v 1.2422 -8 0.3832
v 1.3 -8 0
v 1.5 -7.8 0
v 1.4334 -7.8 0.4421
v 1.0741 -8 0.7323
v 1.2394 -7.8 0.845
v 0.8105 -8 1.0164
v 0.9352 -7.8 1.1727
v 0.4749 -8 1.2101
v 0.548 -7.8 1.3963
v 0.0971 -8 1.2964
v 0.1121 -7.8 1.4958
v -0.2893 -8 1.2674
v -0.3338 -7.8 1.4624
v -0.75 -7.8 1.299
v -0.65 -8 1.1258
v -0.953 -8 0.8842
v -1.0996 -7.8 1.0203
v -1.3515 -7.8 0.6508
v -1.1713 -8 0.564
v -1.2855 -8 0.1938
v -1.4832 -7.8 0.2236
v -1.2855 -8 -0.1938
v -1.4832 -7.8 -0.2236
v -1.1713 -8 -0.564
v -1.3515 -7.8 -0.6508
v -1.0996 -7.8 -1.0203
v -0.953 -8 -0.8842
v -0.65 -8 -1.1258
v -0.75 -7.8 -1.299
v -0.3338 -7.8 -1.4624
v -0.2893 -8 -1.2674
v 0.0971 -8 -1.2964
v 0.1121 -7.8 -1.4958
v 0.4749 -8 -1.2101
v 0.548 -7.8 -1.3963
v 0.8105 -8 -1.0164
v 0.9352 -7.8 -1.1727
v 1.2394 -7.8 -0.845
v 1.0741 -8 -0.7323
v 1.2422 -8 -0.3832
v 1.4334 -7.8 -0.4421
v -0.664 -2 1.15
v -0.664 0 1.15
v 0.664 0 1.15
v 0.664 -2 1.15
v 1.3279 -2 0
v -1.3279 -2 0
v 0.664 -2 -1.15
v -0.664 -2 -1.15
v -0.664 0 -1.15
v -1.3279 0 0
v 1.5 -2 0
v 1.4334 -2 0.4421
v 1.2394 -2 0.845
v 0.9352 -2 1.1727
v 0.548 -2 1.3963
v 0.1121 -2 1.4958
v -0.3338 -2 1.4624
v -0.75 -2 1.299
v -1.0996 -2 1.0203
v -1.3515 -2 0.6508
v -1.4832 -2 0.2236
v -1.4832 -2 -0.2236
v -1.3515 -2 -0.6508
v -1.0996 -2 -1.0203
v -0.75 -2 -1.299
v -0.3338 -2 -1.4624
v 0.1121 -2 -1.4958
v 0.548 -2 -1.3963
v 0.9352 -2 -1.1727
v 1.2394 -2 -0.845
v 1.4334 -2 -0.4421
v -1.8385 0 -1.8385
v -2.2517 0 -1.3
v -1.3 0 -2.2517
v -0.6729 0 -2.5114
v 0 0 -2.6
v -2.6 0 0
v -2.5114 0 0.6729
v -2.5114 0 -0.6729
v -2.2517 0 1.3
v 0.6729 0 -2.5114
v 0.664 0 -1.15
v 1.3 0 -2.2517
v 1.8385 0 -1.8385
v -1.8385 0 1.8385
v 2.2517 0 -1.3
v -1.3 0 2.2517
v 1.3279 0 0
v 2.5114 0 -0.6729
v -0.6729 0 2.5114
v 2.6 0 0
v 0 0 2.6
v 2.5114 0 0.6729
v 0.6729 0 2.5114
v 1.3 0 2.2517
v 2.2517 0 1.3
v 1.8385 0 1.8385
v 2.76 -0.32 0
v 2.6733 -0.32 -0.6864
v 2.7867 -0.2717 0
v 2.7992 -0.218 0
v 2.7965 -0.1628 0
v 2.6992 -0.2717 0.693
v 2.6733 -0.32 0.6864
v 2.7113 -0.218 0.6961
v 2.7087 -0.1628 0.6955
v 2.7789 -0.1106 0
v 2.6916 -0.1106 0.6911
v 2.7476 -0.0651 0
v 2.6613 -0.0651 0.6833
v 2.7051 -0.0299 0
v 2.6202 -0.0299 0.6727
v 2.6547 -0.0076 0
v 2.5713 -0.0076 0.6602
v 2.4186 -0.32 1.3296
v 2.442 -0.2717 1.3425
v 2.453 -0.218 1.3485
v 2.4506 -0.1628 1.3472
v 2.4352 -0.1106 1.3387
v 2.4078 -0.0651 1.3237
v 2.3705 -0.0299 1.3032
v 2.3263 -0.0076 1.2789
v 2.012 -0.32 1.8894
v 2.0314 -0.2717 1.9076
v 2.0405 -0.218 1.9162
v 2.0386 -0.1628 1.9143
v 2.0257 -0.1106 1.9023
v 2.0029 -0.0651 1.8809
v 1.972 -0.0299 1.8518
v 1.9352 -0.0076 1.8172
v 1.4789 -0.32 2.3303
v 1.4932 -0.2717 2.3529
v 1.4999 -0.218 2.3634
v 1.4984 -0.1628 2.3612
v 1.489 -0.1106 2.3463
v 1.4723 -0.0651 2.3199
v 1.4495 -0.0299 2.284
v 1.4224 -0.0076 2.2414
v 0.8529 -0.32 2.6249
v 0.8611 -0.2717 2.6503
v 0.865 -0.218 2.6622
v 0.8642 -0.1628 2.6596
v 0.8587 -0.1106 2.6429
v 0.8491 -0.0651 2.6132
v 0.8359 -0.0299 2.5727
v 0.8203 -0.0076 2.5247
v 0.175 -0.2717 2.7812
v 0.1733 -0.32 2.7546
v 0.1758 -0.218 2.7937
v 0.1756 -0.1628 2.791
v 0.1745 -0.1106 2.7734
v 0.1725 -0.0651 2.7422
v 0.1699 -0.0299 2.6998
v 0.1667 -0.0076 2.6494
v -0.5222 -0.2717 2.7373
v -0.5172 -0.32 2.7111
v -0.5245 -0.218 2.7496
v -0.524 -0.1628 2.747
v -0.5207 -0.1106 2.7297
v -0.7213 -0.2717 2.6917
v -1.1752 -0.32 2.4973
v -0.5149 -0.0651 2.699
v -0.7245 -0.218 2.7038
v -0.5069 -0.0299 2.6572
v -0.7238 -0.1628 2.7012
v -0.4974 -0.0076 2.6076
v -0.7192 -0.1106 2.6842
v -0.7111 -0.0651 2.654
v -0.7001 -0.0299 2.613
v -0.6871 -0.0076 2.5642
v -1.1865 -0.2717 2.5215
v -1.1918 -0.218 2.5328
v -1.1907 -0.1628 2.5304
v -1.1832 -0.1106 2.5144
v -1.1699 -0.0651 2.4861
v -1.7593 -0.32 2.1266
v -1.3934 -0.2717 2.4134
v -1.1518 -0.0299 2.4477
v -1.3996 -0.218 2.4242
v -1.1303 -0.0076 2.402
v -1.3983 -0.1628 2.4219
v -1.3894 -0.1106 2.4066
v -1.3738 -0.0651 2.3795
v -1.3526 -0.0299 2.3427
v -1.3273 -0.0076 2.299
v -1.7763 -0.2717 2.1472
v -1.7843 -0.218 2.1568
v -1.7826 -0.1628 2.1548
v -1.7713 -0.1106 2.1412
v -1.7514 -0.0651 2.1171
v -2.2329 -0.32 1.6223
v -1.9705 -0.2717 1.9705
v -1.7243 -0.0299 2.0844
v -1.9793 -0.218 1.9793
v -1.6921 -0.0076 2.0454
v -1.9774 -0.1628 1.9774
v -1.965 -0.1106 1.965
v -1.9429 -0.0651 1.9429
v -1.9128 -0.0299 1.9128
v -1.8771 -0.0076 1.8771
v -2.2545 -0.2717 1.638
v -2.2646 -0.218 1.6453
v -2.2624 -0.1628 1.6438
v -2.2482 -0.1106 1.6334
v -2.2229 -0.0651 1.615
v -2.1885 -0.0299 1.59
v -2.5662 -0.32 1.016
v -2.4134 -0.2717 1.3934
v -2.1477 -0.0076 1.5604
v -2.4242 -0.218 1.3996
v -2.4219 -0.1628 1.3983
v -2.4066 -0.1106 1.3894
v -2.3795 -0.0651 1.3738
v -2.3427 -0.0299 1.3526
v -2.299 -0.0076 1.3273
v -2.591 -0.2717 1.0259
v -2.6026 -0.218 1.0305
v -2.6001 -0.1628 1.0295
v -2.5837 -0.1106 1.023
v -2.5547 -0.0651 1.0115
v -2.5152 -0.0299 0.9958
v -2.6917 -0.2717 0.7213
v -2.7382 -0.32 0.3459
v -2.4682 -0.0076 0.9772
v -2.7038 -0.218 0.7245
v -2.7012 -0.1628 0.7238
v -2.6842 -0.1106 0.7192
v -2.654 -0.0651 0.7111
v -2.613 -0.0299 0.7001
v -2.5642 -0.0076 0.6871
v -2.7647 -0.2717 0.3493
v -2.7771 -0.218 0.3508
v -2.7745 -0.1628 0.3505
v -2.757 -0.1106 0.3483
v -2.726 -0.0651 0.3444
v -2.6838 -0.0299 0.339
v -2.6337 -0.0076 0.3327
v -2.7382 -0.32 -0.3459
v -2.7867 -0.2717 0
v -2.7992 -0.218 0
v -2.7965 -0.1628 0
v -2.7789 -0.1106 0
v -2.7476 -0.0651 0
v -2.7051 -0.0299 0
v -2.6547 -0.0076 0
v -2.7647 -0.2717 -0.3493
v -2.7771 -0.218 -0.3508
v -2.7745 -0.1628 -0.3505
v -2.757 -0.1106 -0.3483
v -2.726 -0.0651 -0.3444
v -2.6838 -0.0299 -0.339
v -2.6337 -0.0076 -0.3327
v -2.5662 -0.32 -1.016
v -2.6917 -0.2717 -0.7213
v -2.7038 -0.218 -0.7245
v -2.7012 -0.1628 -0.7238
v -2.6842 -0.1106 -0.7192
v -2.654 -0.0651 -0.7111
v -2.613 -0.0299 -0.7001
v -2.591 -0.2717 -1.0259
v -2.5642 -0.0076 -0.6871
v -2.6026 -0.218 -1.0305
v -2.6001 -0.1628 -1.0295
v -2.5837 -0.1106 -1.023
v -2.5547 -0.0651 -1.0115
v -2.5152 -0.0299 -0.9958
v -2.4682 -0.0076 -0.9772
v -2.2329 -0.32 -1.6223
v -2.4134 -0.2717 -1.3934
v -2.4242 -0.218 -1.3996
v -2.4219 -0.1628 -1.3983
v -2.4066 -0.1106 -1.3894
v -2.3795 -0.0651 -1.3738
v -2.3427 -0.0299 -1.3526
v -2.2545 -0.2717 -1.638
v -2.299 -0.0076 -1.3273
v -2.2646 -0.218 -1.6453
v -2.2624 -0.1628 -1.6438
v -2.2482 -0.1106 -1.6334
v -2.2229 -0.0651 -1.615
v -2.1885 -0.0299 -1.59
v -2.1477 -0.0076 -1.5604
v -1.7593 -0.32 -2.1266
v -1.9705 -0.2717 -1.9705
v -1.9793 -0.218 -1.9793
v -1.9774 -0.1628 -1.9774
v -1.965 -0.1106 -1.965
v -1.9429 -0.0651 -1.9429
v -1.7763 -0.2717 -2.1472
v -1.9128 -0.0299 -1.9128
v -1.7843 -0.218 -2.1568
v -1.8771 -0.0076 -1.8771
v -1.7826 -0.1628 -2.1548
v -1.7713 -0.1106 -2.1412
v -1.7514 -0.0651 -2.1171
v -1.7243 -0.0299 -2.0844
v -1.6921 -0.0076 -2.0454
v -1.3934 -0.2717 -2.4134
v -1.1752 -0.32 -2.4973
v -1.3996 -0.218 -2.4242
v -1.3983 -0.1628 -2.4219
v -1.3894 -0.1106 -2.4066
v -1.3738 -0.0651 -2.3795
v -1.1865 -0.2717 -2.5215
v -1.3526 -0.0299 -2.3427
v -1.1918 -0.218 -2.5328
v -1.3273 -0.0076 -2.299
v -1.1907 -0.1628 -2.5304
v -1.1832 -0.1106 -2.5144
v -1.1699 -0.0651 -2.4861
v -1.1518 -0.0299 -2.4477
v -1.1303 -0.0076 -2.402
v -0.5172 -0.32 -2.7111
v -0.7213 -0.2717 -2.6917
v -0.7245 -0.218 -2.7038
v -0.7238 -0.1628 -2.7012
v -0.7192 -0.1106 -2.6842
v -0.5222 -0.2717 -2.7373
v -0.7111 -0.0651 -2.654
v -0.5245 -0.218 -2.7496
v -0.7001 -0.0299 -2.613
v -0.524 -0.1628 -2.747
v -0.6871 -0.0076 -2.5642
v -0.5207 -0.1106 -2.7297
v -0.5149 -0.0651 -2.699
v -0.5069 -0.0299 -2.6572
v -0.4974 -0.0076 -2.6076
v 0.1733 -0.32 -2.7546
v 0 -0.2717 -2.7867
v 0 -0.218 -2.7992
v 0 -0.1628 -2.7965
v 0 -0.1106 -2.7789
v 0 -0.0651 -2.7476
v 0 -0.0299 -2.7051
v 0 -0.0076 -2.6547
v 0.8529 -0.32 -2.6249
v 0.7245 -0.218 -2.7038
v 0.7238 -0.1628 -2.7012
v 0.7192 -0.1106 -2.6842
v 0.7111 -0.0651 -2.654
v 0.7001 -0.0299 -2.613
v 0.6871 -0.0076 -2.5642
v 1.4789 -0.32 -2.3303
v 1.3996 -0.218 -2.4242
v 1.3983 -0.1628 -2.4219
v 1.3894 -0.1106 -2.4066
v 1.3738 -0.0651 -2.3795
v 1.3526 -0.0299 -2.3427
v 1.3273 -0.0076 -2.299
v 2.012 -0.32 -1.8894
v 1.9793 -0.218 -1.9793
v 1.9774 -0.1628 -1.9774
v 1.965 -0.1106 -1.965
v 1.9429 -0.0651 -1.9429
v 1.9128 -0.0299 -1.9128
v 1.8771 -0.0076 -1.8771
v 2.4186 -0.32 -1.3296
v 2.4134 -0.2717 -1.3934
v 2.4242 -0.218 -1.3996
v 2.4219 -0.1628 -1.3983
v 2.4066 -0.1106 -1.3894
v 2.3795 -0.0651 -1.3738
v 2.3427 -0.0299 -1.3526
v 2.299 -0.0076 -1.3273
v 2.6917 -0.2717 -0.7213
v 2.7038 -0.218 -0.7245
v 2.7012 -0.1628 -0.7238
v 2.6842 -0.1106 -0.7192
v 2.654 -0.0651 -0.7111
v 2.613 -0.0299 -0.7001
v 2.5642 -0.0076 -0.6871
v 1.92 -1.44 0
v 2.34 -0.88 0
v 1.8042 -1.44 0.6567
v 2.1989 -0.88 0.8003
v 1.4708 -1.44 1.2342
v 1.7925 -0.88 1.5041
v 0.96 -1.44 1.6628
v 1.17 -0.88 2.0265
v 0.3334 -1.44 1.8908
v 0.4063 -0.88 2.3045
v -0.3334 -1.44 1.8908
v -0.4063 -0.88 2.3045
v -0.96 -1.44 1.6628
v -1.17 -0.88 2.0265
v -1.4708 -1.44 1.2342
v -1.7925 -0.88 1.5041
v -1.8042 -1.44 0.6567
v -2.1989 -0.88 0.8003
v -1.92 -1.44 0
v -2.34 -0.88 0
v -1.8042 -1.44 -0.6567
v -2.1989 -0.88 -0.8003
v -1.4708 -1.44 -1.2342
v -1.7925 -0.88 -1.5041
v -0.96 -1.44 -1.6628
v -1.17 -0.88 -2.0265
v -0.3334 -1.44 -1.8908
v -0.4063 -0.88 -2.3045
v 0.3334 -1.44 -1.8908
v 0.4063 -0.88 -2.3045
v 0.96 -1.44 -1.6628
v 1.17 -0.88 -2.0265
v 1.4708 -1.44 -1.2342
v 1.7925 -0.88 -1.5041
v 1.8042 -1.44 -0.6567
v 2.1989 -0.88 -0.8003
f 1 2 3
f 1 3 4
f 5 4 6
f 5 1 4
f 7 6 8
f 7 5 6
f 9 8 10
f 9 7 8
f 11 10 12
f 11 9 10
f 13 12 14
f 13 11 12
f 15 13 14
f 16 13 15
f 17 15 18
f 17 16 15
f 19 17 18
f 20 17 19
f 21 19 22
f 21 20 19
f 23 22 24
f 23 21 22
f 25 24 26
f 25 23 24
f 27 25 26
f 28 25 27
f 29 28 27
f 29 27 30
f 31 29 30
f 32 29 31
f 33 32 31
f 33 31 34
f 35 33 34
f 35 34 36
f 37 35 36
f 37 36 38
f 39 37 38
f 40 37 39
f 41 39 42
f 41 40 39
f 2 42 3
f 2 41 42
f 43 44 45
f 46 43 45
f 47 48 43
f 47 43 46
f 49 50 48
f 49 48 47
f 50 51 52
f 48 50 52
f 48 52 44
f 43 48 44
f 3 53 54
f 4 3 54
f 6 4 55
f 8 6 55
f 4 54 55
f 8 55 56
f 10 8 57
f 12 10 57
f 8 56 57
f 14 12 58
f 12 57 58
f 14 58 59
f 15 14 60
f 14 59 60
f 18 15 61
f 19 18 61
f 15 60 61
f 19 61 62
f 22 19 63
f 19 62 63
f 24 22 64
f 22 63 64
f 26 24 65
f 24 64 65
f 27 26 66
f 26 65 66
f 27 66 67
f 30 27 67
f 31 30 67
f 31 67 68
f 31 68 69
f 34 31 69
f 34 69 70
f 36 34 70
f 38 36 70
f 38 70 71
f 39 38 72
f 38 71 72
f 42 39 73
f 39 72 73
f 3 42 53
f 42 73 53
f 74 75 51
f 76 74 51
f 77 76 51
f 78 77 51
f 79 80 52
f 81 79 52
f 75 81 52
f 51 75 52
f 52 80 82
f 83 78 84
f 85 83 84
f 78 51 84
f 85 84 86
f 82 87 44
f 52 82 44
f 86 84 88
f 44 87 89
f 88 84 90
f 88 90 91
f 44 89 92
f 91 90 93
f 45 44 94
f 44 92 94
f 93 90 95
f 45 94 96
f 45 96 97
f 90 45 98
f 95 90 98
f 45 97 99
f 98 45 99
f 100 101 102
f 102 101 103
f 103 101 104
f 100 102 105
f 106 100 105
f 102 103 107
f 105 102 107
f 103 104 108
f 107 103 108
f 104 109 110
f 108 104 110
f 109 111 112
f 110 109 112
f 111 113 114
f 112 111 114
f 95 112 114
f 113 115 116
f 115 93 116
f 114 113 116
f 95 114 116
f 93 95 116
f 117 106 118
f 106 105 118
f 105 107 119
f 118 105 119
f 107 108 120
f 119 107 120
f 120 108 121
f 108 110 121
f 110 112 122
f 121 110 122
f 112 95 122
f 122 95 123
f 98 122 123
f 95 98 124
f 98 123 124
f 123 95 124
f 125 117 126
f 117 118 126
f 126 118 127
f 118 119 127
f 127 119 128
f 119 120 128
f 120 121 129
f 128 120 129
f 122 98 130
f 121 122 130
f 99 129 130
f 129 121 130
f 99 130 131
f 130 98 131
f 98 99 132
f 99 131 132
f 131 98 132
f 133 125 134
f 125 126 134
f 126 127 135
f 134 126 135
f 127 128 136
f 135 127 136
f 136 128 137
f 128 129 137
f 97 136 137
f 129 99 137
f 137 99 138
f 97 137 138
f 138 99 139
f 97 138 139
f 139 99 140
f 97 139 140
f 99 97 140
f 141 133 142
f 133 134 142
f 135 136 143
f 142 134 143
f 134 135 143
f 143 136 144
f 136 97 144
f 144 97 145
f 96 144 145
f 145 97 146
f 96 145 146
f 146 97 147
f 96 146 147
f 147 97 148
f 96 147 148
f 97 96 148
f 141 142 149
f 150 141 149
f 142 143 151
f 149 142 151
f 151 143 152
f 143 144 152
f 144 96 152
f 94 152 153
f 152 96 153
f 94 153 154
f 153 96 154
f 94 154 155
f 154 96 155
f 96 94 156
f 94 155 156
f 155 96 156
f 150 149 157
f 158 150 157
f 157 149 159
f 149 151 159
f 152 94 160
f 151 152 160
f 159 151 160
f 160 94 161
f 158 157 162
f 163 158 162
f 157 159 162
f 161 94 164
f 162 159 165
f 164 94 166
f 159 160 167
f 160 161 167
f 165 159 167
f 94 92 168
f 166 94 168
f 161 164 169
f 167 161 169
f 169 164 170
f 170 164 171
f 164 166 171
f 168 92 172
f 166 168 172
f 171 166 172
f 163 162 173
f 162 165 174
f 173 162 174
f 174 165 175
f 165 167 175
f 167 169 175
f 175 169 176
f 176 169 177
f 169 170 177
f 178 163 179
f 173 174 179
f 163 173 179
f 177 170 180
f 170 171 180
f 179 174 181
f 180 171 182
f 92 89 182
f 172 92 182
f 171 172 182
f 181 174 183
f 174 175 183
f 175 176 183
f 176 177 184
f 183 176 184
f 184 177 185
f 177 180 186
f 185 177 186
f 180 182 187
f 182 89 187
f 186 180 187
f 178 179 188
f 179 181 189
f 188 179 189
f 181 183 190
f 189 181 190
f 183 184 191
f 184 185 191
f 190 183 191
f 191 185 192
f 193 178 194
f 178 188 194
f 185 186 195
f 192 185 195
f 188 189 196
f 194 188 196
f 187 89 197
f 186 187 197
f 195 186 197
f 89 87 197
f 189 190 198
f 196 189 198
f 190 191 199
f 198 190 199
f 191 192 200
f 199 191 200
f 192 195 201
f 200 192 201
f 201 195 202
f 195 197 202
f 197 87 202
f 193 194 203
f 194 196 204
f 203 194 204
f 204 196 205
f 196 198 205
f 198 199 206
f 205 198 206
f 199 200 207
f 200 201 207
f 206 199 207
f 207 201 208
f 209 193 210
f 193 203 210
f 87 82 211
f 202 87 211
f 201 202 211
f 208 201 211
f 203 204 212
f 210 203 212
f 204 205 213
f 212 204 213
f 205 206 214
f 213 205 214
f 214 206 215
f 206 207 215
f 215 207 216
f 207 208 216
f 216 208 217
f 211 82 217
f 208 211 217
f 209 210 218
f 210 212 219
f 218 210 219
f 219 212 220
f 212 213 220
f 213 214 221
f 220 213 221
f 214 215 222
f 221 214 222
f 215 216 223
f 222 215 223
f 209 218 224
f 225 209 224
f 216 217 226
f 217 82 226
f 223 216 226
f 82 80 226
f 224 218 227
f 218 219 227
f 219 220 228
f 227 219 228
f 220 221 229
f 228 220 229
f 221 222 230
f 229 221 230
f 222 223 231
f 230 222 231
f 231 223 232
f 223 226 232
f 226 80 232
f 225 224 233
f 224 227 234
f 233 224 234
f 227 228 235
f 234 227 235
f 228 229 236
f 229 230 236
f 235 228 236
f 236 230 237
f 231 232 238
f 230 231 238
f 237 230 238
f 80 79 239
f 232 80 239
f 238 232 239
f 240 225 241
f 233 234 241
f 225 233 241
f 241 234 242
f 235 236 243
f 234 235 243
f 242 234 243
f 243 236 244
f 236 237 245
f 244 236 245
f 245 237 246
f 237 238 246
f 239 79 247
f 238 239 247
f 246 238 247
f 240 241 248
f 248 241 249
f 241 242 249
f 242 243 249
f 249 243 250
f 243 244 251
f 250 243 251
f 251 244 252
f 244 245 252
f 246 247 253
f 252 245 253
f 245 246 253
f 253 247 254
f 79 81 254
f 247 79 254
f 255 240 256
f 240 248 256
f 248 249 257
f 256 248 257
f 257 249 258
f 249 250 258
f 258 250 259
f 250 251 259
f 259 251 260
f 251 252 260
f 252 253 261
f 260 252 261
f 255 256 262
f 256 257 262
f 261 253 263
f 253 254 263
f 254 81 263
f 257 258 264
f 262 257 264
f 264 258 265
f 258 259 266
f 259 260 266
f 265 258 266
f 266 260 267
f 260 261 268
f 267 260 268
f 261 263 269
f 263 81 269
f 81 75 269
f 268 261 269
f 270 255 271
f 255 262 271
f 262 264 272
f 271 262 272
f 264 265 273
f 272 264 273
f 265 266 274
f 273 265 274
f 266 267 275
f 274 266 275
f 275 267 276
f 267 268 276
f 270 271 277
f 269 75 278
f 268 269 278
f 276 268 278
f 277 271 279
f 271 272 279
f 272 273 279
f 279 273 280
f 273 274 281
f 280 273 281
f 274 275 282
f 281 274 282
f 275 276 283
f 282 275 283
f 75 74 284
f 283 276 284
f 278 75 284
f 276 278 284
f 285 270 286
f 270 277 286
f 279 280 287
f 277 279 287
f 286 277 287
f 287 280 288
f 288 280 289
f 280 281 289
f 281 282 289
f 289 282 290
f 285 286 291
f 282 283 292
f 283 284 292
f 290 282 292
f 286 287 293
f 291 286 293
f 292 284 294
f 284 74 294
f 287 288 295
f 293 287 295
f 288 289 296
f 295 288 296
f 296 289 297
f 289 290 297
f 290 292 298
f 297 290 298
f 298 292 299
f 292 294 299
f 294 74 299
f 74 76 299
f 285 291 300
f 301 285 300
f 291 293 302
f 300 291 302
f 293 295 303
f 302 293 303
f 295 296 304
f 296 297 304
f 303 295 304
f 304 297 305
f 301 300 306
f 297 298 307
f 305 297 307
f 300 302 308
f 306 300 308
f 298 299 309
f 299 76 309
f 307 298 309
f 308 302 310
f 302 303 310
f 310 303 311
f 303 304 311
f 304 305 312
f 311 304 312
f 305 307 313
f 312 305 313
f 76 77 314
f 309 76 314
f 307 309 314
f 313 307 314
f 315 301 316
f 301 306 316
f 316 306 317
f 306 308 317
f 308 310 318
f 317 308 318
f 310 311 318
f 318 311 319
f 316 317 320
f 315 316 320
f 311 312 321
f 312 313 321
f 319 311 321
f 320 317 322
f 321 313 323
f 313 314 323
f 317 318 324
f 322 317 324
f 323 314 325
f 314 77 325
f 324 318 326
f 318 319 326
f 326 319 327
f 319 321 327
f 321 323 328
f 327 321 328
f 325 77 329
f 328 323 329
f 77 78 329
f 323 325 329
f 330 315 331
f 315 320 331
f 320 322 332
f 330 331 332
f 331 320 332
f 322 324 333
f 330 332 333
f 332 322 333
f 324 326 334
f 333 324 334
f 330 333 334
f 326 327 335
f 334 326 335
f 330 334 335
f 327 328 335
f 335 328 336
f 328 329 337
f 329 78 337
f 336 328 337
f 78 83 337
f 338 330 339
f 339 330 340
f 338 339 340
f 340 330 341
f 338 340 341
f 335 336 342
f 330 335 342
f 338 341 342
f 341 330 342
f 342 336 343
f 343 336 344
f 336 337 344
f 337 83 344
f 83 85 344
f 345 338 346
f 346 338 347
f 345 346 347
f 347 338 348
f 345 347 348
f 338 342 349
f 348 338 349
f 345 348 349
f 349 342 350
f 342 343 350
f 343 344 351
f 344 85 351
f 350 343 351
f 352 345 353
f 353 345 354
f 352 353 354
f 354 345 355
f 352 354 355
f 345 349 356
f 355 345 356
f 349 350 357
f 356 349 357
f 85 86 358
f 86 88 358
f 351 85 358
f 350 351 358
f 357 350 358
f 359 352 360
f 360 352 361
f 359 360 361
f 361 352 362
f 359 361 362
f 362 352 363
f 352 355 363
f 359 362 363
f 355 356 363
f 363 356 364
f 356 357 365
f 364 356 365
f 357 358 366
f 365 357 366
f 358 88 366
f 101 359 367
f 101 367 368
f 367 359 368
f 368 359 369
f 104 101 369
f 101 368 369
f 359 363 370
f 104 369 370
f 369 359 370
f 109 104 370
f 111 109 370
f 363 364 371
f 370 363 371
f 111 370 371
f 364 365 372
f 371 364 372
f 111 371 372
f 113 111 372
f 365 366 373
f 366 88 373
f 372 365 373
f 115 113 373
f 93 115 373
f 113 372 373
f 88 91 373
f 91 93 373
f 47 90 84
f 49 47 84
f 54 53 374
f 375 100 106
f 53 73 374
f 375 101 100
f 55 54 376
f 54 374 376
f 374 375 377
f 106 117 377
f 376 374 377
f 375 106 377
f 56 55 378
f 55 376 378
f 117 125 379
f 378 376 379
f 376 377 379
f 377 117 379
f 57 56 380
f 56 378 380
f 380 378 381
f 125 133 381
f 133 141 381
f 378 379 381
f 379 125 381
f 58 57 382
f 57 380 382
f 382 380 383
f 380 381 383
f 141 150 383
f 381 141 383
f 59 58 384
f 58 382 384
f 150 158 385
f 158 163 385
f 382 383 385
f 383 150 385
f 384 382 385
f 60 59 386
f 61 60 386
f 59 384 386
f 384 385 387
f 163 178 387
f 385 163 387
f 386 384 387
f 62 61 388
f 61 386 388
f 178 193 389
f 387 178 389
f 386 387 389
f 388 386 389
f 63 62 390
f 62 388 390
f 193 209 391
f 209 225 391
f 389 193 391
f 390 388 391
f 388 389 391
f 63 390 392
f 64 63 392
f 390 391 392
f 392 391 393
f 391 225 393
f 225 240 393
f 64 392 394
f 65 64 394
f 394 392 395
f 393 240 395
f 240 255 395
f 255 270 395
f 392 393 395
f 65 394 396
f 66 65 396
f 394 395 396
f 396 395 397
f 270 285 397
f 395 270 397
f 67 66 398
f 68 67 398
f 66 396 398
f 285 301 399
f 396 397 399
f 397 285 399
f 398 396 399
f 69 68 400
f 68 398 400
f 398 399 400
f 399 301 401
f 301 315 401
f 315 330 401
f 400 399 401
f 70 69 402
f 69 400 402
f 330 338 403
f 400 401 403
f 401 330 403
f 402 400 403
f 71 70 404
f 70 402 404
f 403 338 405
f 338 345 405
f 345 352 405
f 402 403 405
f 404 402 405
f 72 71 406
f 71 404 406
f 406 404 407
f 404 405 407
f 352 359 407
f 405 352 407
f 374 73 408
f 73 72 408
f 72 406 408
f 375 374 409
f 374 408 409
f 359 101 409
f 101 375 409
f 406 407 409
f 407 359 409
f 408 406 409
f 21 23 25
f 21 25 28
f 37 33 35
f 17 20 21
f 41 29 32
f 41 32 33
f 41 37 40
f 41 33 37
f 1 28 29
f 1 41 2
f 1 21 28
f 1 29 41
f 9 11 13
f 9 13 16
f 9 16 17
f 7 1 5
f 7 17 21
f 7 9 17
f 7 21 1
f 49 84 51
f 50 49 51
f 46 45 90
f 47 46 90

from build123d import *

# Parameters (mm, degrees)
SKETCH_2_R          = 1.5
EXTRUDE_1_DEPTH     = 6
CUT_EXTRUDE_1_DEPTH = 2
CHAMFER_1_SIZE      = 0.2
FILLET_1_R          = 0.2


with BuildPart() as part:
    # 草图1 → 旋转1 (revolve)
    with BuildSketch(Plane.XY):
        Polygon((0, 0), (0, -2), (1.5, -2), (3, 0), align=None)
    revolve(axis=Axis((0, 0, 0), (0, -1, 0)))

    # 草图2 → 凸台-拉伸1 (add)
    with BuildSketch(Plane.XZ.offset(2)):
        Circle(SKETCH_2_R)
    extrude(amount=EXTRUDE_1_DEPTH)

    # 草图3 → 切除-拉伸1 (cut)
    with BuildSketch(Plane(origin=(0, 0, 0), x_dir=(1, 0, 0), z_dir=(0, 1, 0))):
        Polygon((-1.327905619, 0), (-0.66395281, -1.15), (0.66395281, -1.15), (1.327905619, 0), (0.66395281, 1.15), (-0.66395281, 1.15), align=None)
    extrude(amount=-CUT_EXTRUDE_1_DEPTH, mode=Mode.SUBTRACT)

    # 倒角1
    chamfer_1_edges = [part.edges().sort_by_distance(p)[0] for p in [
        (-1.5, -8, 0),
    ]]
    chamfer(chamfer_1_edges, length=CHAMFER_1_SIZE)

    # 圆角1
    fillet_1_edges = [part.edges().sort_by_distance(p)[0] for p in [
        (-3, 0, 0),
    ]]
    fillet(fillet_1_edges, radius=FILLET_1_R)


solid = part.part
